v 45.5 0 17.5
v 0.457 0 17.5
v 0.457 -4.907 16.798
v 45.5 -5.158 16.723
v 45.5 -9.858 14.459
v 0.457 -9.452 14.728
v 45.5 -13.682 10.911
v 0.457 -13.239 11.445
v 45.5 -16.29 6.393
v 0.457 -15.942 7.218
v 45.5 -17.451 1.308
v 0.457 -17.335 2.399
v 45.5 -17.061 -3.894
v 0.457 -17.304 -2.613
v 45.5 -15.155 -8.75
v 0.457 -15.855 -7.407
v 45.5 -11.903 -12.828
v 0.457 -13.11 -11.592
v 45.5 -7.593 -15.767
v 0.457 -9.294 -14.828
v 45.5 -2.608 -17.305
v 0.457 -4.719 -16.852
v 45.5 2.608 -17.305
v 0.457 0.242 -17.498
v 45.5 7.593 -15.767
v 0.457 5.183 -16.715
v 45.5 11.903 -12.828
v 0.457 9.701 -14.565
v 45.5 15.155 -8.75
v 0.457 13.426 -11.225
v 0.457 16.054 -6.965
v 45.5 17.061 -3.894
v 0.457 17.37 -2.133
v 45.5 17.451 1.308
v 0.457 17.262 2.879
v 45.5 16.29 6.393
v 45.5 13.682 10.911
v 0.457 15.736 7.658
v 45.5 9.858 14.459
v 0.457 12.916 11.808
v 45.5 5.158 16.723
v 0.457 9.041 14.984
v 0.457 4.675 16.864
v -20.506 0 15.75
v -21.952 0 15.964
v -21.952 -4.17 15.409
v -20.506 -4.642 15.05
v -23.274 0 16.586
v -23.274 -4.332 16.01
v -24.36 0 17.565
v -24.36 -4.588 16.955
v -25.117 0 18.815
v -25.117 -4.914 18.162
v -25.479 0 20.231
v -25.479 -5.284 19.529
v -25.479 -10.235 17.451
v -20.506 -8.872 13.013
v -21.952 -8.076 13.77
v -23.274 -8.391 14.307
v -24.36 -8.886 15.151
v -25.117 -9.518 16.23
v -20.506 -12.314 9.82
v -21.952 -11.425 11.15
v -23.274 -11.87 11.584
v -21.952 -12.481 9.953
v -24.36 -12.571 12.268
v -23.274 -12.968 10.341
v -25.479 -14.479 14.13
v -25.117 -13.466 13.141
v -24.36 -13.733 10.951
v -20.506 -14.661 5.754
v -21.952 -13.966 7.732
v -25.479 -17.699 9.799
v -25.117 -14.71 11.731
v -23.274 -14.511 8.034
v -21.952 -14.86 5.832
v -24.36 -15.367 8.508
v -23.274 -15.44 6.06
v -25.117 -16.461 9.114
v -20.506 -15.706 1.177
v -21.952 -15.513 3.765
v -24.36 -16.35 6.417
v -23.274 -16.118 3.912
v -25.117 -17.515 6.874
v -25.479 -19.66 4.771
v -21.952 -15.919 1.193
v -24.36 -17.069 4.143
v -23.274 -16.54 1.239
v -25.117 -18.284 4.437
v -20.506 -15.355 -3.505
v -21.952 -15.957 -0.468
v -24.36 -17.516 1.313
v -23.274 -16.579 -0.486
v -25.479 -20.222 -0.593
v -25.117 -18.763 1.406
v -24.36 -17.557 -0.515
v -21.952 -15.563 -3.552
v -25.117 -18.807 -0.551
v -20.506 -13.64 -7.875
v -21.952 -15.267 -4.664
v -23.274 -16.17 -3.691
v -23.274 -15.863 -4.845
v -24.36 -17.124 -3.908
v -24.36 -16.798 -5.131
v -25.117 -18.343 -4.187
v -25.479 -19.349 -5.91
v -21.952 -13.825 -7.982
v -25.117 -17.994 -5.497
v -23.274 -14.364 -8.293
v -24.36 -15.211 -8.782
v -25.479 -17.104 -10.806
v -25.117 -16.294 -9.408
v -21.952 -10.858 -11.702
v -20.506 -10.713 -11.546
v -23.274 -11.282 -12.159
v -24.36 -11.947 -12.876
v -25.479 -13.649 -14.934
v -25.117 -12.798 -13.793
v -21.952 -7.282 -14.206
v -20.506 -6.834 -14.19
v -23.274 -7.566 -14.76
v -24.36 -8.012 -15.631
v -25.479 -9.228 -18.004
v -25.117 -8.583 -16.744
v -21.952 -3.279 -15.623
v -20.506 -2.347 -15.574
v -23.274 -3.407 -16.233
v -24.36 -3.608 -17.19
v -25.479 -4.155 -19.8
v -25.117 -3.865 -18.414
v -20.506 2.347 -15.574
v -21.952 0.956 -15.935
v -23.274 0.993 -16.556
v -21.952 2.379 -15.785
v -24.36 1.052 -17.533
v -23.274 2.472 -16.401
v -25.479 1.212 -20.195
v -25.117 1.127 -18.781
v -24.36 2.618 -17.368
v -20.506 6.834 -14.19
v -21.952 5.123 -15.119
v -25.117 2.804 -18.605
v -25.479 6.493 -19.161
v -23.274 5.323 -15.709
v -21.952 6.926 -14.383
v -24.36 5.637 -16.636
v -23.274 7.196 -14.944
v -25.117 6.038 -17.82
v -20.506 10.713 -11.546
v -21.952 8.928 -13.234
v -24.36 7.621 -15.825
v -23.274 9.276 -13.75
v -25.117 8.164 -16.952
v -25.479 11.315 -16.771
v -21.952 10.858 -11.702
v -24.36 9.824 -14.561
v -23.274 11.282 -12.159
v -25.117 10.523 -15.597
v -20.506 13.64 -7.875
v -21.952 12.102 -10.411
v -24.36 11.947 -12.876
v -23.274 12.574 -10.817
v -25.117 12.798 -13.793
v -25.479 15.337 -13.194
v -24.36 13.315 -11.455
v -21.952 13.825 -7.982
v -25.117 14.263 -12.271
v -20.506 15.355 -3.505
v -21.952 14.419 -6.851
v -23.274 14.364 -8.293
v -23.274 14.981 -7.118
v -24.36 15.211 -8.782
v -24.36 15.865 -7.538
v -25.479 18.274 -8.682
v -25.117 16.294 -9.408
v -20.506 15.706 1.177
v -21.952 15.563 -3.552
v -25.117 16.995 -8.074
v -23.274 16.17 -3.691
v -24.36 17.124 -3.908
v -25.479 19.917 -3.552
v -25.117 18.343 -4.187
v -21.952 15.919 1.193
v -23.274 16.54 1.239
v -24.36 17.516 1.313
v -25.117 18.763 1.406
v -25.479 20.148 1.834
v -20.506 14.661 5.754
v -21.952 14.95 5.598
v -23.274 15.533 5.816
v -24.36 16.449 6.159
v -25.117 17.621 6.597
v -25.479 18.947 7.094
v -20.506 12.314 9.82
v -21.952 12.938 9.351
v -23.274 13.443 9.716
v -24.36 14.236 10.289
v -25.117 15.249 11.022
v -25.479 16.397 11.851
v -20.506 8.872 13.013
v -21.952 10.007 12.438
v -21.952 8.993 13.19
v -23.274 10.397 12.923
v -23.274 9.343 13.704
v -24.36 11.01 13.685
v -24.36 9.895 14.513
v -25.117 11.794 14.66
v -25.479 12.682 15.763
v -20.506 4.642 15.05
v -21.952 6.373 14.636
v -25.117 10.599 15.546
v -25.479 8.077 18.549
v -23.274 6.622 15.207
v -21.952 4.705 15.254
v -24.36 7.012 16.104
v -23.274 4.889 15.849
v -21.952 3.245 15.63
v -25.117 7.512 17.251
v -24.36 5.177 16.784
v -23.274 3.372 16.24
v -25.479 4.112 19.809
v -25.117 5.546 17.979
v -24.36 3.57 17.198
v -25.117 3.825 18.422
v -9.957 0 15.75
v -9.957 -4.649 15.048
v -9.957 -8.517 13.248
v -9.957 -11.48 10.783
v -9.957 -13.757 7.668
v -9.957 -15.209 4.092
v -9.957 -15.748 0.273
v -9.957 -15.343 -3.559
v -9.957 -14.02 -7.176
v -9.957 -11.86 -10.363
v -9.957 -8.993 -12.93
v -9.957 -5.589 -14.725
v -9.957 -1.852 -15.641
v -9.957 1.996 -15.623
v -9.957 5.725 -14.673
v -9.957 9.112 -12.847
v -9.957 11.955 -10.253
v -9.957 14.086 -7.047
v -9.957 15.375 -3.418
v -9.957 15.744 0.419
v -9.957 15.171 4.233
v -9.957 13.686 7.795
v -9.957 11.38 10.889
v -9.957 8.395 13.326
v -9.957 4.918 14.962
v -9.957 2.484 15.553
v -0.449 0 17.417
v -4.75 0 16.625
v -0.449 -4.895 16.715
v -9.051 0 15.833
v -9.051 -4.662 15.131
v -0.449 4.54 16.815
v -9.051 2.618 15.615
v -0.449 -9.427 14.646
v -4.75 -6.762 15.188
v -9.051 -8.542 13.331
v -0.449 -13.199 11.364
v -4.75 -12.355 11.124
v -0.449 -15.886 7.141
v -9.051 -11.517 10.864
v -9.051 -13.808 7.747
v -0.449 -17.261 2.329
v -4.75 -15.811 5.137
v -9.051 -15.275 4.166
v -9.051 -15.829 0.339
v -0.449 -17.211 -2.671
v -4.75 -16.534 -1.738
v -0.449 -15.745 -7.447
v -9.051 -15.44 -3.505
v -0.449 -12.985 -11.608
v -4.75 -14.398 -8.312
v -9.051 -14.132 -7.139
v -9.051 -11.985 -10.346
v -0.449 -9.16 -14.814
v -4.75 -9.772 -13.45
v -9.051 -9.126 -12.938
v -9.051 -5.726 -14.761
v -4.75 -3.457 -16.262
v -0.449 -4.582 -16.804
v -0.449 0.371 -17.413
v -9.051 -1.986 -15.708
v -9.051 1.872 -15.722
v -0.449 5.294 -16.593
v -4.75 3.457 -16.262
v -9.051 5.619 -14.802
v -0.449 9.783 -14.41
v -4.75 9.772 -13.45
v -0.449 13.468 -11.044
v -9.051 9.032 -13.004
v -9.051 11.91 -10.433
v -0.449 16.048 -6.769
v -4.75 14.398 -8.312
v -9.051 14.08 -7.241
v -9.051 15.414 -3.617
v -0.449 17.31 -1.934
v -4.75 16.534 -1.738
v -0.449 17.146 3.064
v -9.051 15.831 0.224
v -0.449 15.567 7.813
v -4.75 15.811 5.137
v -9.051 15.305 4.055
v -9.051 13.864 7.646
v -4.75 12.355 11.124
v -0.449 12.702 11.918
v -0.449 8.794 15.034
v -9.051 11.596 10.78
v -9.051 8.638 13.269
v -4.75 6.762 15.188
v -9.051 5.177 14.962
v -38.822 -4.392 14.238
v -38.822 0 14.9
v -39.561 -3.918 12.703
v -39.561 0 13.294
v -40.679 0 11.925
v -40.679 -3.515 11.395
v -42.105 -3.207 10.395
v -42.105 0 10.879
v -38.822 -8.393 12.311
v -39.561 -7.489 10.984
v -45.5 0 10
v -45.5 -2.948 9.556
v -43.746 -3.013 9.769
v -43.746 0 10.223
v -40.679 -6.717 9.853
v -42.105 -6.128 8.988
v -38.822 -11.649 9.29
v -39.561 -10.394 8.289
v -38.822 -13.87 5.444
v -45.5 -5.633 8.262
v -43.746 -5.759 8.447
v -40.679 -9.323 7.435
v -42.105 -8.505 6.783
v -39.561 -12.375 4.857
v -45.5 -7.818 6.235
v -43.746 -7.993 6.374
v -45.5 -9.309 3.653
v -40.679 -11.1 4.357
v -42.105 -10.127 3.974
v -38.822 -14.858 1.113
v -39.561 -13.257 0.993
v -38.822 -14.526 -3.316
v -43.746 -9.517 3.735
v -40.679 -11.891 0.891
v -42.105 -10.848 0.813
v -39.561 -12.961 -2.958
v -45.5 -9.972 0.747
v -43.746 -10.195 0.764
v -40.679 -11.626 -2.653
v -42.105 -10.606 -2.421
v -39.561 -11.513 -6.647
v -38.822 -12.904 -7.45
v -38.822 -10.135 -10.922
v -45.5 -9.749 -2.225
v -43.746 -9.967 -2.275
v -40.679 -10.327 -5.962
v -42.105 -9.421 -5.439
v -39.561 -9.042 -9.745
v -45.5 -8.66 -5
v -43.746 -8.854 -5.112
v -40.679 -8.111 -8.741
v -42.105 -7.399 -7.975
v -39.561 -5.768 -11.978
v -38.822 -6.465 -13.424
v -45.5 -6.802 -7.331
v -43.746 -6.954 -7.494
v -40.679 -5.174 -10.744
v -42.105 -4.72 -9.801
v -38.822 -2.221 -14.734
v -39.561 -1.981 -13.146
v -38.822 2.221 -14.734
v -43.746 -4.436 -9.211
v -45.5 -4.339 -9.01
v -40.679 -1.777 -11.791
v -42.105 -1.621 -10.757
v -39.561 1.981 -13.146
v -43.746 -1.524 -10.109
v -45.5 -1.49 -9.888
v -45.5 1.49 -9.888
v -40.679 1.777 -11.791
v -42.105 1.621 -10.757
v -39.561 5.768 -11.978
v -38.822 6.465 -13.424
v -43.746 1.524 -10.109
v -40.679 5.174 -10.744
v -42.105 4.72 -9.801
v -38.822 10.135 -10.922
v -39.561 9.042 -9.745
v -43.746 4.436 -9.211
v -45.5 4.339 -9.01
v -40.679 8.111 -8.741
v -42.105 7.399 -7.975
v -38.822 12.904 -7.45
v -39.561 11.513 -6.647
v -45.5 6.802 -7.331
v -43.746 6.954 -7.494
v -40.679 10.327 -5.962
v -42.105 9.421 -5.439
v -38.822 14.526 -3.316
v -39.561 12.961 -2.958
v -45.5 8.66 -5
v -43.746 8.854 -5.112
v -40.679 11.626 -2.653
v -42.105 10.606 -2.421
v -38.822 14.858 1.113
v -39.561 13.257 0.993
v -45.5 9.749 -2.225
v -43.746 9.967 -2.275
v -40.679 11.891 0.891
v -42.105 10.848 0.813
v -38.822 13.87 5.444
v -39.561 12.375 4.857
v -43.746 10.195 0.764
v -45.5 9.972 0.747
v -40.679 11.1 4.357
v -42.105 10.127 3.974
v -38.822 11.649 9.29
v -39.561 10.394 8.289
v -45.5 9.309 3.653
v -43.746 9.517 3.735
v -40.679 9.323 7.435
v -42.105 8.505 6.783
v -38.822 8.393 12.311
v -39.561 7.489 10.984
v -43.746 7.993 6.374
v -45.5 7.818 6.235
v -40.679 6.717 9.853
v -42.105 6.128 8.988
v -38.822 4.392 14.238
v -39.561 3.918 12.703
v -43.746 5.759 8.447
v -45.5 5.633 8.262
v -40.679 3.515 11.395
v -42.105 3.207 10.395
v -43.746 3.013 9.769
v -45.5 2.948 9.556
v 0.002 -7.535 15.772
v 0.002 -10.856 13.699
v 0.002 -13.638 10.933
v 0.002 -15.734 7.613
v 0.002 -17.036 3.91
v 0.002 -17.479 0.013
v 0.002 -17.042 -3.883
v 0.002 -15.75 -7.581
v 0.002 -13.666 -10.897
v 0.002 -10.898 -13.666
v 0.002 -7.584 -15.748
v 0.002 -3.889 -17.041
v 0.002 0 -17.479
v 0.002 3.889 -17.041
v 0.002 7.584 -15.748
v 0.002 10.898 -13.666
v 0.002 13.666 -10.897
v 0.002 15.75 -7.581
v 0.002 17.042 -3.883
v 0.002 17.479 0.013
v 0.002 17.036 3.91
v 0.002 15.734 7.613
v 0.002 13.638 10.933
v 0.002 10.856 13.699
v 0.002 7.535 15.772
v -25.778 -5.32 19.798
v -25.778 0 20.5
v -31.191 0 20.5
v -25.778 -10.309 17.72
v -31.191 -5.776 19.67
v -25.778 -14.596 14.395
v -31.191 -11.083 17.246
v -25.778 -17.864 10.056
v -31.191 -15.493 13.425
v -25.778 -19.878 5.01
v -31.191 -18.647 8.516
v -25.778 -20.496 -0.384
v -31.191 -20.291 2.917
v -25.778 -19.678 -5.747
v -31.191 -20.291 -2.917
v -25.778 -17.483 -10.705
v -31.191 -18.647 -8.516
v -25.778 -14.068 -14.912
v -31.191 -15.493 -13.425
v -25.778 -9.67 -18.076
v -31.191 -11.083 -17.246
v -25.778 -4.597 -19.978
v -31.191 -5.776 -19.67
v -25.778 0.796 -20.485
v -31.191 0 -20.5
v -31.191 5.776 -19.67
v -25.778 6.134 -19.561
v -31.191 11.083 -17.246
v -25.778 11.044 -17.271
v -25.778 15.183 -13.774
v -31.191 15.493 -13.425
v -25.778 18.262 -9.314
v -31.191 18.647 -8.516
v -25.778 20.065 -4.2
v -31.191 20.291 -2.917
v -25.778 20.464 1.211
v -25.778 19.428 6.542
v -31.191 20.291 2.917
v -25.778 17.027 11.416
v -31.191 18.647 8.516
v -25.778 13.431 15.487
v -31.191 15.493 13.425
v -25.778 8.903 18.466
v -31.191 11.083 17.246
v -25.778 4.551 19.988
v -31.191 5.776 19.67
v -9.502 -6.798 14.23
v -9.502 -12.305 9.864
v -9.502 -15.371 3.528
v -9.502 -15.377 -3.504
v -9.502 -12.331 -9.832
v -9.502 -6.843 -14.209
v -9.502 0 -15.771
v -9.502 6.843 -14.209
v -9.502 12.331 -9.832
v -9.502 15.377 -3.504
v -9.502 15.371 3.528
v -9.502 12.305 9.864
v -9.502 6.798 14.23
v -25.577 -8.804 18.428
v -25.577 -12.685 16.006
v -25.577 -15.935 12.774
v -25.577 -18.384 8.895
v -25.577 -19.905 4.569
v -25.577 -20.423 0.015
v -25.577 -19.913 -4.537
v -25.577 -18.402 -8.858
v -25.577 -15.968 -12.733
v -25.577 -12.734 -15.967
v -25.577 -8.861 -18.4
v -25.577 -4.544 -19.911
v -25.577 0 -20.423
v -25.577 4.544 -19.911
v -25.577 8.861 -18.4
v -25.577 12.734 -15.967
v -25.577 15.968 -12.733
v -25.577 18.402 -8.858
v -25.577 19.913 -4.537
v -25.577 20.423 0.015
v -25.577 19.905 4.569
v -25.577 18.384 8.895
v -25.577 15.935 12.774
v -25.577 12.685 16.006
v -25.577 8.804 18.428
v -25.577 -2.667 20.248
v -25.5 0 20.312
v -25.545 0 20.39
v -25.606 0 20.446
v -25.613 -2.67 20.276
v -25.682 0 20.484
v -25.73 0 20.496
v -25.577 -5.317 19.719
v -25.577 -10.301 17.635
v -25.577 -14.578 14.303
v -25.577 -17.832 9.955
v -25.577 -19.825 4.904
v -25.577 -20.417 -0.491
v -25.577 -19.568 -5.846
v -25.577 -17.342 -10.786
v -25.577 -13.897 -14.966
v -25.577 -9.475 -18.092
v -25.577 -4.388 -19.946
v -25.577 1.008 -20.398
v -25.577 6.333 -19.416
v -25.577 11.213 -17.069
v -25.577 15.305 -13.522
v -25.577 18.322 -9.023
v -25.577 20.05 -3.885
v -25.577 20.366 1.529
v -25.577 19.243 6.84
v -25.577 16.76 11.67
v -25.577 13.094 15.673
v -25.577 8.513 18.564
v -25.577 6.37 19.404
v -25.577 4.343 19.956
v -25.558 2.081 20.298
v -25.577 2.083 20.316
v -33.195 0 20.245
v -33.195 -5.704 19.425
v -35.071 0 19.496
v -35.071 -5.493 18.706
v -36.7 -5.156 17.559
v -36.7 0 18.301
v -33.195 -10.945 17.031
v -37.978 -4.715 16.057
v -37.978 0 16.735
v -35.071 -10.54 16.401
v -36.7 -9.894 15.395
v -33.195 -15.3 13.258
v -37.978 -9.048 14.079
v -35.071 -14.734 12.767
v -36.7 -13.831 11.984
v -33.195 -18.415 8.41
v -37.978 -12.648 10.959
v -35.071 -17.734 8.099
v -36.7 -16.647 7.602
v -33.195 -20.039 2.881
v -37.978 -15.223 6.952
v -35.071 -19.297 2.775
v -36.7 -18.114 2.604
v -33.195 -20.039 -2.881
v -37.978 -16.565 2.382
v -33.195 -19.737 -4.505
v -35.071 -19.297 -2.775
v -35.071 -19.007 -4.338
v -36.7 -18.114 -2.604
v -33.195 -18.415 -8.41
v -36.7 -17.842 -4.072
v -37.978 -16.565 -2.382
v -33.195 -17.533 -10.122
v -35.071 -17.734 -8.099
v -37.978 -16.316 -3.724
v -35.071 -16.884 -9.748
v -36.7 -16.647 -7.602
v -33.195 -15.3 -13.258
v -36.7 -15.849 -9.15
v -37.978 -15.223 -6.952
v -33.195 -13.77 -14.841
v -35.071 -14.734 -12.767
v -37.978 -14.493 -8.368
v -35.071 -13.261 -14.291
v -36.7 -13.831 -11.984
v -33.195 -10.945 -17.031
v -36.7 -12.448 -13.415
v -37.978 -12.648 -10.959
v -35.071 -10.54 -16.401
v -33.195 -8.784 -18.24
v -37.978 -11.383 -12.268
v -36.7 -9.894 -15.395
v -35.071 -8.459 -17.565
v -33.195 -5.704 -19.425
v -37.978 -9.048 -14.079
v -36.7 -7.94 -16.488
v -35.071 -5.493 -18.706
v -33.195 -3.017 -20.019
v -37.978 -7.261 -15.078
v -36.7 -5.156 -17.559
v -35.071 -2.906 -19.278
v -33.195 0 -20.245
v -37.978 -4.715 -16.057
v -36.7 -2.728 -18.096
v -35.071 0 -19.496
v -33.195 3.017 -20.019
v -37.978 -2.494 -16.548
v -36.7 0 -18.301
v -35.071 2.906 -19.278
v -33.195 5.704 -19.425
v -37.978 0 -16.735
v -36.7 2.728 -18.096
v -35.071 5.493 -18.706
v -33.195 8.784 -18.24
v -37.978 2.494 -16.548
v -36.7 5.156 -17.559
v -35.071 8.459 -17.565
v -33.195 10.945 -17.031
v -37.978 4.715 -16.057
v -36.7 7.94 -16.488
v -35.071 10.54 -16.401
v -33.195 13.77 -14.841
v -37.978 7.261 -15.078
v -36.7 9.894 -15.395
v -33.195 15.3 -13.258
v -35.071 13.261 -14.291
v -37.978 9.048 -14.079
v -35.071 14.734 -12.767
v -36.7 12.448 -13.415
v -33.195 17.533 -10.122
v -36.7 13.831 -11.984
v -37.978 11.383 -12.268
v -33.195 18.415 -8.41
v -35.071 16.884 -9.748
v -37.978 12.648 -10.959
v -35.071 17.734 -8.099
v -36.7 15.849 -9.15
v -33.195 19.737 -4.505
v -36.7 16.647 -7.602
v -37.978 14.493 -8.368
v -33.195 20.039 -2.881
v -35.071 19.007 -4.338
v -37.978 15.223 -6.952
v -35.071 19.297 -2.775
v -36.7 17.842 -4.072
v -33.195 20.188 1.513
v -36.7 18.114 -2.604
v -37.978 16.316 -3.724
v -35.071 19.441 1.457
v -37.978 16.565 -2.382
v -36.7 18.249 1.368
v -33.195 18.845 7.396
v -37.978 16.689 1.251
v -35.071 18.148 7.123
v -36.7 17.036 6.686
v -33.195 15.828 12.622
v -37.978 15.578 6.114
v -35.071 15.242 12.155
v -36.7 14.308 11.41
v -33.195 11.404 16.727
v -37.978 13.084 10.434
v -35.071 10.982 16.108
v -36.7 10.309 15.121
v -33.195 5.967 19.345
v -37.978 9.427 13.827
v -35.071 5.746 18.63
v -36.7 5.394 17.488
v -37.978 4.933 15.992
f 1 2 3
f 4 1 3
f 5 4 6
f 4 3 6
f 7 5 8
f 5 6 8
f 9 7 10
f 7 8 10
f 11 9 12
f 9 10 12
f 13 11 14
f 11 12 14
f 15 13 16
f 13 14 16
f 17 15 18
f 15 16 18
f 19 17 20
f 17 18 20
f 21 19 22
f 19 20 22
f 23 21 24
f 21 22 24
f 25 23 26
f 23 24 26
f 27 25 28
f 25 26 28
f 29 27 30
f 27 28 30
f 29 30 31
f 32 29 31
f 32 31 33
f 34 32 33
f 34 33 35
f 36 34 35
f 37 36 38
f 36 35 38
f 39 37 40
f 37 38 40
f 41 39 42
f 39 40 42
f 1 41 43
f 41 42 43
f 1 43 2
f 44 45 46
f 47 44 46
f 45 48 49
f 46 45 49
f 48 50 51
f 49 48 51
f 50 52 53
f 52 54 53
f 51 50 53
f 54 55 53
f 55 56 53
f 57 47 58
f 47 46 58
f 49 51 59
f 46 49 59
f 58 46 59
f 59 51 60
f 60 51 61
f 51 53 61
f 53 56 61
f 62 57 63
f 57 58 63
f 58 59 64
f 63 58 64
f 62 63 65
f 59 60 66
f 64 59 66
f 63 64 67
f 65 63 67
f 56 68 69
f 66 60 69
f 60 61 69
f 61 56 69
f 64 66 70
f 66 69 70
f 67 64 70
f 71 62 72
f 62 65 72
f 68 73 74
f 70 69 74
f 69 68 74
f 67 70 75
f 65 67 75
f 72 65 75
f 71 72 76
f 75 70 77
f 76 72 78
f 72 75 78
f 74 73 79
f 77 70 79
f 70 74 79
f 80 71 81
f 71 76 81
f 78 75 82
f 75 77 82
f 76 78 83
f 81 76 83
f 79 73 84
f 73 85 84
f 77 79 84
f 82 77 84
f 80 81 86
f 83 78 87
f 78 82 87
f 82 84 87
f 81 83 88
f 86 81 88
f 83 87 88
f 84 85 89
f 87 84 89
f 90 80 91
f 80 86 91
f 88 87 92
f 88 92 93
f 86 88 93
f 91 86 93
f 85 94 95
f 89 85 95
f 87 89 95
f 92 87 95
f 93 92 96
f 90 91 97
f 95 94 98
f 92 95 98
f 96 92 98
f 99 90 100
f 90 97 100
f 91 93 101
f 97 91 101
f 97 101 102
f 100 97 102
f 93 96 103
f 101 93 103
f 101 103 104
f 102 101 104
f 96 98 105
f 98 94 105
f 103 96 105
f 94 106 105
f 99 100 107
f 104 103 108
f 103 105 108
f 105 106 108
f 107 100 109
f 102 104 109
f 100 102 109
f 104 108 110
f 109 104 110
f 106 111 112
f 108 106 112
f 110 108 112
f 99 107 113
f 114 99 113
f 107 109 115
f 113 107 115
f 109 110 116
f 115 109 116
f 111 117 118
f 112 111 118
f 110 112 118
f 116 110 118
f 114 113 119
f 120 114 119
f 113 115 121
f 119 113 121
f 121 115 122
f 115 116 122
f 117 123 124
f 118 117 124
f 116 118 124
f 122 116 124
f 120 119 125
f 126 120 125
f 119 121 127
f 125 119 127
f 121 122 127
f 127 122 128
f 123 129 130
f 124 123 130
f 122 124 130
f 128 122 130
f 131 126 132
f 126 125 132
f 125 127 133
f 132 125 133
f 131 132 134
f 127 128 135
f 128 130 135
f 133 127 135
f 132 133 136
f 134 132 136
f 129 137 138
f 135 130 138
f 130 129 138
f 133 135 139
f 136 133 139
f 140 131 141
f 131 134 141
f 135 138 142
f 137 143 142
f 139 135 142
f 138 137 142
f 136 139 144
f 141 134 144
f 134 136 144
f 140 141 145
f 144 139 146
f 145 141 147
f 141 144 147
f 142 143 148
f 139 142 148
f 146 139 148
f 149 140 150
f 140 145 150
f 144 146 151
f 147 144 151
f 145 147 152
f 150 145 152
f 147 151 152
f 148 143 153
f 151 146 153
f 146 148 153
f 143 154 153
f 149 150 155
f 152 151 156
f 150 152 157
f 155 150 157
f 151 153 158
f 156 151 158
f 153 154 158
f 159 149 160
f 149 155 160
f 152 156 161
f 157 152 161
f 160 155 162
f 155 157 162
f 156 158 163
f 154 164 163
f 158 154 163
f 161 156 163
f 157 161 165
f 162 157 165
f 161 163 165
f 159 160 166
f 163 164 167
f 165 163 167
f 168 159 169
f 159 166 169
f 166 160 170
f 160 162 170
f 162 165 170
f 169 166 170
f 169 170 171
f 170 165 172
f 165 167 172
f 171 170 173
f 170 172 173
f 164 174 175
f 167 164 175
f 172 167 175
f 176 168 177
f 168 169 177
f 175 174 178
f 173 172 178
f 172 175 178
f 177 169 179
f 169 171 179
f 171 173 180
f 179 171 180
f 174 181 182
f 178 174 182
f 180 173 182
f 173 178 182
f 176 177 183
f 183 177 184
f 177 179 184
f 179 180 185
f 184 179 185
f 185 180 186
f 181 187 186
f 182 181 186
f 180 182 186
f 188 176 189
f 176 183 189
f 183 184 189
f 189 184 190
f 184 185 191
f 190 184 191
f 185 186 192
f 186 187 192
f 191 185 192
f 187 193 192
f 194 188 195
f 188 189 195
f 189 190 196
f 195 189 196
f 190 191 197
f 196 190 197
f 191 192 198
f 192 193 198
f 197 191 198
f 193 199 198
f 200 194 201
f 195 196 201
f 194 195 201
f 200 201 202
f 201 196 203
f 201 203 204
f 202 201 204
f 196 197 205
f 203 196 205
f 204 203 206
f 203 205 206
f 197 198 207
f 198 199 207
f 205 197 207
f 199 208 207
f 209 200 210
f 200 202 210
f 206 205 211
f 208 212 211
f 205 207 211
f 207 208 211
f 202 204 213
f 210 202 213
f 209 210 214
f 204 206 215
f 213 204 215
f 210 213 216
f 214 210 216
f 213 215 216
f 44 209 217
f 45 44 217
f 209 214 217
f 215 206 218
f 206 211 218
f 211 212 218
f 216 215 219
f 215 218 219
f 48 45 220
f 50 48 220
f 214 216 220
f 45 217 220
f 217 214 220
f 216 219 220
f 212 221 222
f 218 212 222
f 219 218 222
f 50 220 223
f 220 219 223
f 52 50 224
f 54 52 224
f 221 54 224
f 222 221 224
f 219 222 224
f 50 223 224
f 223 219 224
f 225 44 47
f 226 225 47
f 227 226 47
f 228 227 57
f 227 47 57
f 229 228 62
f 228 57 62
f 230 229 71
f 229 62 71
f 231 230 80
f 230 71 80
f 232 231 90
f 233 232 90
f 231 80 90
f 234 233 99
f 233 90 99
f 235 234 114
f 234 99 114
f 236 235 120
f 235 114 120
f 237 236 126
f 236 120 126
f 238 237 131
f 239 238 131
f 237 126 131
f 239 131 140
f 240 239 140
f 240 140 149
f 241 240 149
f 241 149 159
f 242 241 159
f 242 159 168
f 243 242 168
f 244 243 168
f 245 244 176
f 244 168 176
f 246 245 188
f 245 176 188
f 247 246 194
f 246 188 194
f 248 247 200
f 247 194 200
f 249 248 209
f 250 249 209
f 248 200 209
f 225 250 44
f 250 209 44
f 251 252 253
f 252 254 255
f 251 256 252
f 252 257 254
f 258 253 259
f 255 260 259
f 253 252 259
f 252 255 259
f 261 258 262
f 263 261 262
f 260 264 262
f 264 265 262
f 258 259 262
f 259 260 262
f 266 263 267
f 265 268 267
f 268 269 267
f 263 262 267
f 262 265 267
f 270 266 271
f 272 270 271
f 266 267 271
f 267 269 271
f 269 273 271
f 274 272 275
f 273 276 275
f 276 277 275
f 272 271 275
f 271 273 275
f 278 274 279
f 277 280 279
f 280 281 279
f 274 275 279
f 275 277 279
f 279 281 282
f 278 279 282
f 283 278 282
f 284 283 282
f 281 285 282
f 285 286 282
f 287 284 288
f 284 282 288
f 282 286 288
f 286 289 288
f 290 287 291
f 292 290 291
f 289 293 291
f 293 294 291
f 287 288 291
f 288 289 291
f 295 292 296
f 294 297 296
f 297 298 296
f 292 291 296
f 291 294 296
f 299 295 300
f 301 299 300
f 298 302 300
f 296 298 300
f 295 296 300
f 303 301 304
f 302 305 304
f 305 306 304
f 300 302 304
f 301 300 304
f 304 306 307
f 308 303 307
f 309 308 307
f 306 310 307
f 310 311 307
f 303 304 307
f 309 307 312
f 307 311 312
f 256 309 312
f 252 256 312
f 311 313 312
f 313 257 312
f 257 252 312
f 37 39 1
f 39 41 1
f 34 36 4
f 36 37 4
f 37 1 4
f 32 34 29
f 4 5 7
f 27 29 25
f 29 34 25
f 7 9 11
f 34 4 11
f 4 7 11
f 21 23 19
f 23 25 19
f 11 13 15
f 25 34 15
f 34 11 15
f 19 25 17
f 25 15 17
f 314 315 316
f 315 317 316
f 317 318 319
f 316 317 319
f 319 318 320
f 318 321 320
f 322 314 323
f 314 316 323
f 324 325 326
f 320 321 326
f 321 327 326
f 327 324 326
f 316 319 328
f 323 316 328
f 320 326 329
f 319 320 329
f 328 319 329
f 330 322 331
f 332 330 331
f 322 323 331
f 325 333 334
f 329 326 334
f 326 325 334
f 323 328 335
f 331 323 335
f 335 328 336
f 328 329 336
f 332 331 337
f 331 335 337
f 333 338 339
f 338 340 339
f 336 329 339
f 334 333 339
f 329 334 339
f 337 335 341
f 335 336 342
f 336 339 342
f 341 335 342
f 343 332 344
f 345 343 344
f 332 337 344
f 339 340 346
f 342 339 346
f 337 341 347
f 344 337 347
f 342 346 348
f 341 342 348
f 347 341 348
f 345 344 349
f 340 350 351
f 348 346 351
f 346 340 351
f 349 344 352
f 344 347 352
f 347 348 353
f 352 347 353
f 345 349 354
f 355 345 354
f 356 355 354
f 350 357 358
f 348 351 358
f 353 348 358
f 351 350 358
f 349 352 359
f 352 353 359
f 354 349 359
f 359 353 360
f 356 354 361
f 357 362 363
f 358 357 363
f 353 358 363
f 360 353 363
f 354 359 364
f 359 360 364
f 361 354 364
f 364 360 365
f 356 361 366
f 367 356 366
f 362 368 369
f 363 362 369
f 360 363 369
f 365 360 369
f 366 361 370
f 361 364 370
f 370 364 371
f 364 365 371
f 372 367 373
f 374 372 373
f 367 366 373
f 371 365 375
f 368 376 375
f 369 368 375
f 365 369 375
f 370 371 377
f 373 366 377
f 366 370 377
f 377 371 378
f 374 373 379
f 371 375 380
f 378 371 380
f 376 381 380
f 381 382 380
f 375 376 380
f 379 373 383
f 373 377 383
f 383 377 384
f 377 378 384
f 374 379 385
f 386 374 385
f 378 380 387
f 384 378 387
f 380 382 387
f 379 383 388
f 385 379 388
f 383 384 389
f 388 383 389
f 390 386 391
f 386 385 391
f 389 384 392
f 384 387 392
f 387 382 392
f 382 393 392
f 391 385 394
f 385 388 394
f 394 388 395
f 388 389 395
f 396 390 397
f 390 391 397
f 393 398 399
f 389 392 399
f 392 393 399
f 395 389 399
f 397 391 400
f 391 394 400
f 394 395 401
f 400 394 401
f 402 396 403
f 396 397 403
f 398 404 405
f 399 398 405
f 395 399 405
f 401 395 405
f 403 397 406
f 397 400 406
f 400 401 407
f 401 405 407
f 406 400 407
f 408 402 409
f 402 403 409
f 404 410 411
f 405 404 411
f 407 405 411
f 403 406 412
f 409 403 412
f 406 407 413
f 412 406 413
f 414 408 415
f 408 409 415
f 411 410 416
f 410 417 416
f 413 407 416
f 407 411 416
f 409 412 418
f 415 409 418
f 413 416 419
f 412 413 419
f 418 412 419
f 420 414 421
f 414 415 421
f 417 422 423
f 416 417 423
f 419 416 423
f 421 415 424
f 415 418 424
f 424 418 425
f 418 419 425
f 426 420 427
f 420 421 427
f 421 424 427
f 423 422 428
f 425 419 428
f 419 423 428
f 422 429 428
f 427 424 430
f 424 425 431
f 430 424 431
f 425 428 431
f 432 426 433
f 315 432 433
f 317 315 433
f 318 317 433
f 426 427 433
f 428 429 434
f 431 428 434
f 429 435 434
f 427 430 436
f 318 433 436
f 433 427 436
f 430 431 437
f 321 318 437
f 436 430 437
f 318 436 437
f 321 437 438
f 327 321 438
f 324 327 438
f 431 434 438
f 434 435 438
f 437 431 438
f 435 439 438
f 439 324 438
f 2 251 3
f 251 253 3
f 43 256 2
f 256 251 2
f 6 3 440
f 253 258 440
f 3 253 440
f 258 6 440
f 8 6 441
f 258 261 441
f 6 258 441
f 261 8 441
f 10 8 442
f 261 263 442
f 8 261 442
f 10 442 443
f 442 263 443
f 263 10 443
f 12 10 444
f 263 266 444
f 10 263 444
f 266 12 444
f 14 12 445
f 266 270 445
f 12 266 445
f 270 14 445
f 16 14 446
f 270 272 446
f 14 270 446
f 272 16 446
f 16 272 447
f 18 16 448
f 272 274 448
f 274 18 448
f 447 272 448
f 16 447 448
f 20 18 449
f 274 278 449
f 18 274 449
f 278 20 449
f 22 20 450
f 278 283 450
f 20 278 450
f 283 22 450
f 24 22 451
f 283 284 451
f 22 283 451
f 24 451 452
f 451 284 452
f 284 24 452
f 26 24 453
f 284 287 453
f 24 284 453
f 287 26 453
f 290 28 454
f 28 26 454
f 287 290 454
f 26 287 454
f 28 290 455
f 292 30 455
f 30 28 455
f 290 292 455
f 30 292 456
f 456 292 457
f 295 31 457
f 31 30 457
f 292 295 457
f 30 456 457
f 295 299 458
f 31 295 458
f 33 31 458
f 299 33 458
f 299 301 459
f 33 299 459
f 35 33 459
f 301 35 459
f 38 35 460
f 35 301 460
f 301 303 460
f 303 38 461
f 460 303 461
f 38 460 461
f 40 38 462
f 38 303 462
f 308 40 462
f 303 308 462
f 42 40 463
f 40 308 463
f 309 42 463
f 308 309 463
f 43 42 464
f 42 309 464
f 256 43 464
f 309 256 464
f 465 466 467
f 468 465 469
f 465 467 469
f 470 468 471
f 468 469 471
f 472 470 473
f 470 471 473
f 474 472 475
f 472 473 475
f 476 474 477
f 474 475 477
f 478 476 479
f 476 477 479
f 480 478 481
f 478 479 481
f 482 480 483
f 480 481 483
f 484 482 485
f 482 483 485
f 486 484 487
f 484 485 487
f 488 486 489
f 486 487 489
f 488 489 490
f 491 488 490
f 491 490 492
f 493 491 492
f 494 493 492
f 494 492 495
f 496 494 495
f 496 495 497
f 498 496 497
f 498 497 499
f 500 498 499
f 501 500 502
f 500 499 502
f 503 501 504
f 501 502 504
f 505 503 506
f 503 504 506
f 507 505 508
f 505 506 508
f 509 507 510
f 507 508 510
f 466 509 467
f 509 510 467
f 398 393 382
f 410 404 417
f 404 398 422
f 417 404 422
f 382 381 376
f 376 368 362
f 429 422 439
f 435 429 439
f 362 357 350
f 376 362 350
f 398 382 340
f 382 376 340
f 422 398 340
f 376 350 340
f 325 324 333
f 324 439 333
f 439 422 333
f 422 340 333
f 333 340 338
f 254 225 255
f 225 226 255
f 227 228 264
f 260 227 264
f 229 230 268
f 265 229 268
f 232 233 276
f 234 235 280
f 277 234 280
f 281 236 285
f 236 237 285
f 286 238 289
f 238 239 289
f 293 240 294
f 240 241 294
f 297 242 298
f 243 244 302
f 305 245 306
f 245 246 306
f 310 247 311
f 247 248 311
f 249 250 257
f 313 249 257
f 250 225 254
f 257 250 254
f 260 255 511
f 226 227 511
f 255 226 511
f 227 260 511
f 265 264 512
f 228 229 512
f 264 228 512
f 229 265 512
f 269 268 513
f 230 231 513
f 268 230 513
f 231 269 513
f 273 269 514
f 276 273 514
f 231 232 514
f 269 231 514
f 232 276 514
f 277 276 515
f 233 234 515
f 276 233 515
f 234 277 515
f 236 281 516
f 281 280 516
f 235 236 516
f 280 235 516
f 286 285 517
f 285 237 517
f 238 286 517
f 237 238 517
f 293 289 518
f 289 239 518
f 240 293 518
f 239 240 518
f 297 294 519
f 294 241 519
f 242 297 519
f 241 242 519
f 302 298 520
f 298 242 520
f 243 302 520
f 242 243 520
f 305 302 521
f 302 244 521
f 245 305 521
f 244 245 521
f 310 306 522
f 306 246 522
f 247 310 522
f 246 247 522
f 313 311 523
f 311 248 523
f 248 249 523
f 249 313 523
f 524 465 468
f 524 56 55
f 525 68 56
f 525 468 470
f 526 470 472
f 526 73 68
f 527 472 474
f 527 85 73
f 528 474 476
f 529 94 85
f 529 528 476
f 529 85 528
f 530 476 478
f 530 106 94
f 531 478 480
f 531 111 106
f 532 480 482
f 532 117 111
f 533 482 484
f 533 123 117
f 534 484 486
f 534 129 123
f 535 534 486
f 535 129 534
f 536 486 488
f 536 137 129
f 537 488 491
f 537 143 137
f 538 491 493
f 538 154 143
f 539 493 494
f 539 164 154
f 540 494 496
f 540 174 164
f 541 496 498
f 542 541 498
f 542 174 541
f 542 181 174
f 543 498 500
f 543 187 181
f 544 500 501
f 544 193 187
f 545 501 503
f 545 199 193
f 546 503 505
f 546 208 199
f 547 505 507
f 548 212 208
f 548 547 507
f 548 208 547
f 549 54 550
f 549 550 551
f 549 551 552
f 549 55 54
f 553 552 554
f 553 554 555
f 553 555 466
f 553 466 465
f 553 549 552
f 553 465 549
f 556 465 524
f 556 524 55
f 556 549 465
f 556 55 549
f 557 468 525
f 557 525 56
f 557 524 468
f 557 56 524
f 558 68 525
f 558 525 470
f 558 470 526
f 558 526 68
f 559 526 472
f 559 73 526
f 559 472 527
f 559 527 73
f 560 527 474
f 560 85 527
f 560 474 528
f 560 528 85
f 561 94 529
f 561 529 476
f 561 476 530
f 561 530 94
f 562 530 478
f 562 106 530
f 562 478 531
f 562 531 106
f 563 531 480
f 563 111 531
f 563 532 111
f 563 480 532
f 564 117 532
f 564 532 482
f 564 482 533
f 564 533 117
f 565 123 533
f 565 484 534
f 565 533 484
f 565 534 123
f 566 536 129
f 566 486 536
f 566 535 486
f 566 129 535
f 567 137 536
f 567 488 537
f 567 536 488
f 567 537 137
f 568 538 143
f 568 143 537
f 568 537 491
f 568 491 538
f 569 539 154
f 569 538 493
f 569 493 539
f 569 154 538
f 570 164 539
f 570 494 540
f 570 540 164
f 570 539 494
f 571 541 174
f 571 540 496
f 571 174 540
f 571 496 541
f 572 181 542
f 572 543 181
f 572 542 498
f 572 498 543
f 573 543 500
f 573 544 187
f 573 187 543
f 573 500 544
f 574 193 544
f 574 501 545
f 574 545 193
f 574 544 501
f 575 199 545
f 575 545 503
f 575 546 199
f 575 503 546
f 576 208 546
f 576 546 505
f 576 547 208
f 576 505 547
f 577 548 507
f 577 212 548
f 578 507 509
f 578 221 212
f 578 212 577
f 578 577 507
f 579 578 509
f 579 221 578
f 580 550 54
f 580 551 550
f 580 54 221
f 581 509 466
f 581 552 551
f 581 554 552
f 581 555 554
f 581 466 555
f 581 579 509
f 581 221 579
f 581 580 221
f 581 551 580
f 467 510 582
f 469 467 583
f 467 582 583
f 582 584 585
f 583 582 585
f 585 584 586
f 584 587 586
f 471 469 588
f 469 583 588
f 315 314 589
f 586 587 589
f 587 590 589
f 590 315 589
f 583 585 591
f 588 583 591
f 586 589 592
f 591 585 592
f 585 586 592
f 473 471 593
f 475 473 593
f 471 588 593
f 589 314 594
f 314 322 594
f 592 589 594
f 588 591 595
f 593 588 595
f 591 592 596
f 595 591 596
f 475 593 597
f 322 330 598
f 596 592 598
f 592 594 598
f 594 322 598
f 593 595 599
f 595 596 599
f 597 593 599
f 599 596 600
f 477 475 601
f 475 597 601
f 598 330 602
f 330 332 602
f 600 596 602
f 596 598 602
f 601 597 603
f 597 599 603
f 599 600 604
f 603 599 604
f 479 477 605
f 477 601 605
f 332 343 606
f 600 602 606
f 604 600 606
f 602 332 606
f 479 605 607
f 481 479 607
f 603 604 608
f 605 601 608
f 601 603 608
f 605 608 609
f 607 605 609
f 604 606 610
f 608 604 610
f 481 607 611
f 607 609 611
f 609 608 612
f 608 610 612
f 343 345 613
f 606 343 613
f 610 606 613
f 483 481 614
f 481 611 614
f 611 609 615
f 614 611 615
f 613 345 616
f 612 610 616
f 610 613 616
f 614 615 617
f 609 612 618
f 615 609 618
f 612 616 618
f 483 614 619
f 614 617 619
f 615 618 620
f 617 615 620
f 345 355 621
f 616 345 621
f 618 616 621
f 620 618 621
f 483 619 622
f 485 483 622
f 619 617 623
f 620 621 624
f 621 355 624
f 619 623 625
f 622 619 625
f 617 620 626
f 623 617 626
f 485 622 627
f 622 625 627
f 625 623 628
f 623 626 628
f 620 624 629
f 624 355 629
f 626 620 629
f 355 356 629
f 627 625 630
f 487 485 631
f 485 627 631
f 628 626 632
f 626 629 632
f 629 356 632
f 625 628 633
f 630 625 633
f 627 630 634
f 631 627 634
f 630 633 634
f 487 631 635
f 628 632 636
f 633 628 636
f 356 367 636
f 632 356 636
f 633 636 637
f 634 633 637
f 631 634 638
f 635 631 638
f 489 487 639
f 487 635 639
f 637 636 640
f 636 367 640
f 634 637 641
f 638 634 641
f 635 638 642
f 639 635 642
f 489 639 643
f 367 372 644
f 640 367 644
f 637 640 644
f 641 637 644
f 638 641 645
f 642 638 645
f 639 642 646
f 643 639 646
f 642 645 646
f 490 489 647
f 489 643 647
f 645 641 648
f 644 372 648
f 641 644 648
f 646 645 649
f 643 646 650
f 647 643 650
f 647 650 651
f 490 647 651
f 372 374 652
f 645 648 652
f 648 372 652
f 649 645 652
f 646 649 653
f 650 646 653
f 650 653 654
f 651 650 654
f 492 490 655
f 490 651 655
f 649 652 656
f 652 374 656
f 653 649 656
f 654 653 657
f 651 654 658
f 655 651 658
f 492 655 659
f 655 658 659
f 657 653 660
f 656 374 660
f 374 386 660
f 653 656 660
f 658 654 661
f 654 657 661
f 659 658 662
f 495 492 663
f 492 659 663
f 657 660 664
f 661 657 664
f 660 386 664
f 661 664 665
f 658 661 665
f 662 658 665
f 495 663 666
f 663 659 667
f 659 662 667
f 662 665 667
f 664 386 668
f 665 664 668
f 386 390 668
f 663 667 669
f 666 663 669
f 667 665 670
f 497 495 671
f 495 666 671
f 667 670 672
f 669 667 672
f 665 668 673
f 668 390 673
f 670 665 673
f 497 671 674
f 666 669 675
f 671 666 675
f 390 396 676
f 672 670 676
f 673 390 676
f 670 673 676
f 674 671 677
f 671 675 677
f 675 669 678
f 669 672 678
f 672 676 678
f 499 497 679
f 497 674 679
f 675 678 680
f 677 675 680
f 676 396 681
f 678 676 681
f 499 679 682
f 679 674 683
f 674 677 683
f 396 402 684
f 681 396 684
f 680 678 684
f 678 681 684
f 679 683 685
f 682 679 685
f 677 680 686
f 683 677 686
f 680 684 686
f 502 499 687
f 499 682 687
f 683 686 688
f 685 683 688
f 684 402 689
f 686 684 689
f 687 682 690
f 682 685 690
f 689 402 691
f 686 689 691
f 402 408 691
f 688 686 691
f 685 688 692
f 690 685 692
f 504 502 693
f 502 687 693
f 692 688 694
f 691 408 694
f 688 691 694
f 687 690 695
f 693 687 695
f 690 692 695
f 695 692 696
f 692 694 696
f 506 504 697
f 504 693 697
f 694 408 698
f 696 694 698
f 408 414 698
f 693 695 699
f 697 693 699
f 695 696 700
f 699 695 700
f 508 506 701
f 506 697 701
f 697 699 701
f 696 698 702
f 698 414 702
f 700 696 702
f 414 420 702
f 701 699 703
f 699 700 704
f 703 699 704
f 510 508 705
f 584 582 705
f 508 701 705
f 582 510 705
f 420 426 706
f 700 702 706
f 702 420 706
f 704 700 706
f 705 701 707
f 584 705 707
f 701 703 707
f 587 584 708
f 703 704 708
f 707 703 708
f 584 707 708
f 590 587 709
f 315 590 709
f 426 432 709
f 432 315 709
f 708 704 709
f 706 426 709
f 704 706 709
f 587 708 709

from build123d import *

# Parameters (mm, degrees)
FILLET1_R = 5
FILLET2_R = 0.3
FILLET3_R = 5


with BuildPart() as part:
    # Sketch3 → Revolve1 (revolve)
    with BuildSketch(Plane.XY, mode=Mode.PRIVATE) as revolve1_sk:
        with BuildLine():
            Line((45.5, 0), (45.5, 17.499999999999996))
            Line((45.5, 17.499999999999996), (0, 17.500000000006253))
            Line((0, 17.500000000006253), (-9.5, 15.75))
            Line((-9.5, 15.75), (-25.499999999999996, 15.749999999999996))
            Line((-25.499999999999996, 15.749999999999996), (-25.499999999999996, 20.5))
            Line((-25.499999999999996, 20.5), (-31.190911978745817, 20.5))
            ThreePointArc((-31.190911978745817, 20.5), (-35.92377580522551, 18.949806198638836), (-38.82242559008138, 14.9))
            ThreePointArc((-38.82242559008138, 14.9), (-41.358744151830265, 11.356419576191016), (-45.5, 10))
            Line((-45.5, 10), (-45.5, 0))
            Line((-45.5, 0), (45.5, 0))
        make_face()
    revolve(revolve1_sk.sketch.rotate(Axis((0, 0, 0), (1, 0, 0)), 90), axis=Axis((0, 0, 0), (1, 0, 0)))

    # Fillet1
    # the kernel refuses this fillet: 5 mm, written as the material it adds along each edge
    with BuildSketch(Plane(origin=(-25.499999999999996, 0, 0), x_dir=(0, 1.1e-16, 1), z_dir=(0, 1, -1.1e-16))) as fillet1_piece_1:
        with BuildLine():
            CenterArc((20.75, 4.993746088859542), FILLET1_R, 180, 87.13401601740111)
            Line((20.5, -3.55e-15), (20.495, -0.09987492177719304))
            ThreePointArc((20.495, -0.09987492177719304), (18.125, -0.10000000000000142), (15.749999999999996, -0.10000000000000142))
            Line((15.749999999999996, -0.10000000000000142), (15.649999999999997, 0))
            Line((15.649999999999997, 0), (15.65, 4.993746088859542))
            Line((15.65, 4.993746088859542), (15.75, 4.993746088859542))
        make_face()
    revolve(axis=Axis((-25.499999999999996, 0, 0), (1, 0, 0)))

    # Fillet2
    fillet2_edges = [part.edges().sort_by_distance(p)[0] for p in [
        (-25.499999999999996, -1.389e-14, -20.5),
    ]]
    fillet(fillet2_edges, radius=FILLET2_R)

    # Fillet3
    fillet3_edges = [part.edges().sort_by_distance(p)[0] for p in [
        (0, -4.09e-15, -17.500000000006253),
        (-9.5, -3.68e-15, -15.75),
    ]]
    fillet(fillet3_edges, radius=FILLET3_R)


solid = part.part
